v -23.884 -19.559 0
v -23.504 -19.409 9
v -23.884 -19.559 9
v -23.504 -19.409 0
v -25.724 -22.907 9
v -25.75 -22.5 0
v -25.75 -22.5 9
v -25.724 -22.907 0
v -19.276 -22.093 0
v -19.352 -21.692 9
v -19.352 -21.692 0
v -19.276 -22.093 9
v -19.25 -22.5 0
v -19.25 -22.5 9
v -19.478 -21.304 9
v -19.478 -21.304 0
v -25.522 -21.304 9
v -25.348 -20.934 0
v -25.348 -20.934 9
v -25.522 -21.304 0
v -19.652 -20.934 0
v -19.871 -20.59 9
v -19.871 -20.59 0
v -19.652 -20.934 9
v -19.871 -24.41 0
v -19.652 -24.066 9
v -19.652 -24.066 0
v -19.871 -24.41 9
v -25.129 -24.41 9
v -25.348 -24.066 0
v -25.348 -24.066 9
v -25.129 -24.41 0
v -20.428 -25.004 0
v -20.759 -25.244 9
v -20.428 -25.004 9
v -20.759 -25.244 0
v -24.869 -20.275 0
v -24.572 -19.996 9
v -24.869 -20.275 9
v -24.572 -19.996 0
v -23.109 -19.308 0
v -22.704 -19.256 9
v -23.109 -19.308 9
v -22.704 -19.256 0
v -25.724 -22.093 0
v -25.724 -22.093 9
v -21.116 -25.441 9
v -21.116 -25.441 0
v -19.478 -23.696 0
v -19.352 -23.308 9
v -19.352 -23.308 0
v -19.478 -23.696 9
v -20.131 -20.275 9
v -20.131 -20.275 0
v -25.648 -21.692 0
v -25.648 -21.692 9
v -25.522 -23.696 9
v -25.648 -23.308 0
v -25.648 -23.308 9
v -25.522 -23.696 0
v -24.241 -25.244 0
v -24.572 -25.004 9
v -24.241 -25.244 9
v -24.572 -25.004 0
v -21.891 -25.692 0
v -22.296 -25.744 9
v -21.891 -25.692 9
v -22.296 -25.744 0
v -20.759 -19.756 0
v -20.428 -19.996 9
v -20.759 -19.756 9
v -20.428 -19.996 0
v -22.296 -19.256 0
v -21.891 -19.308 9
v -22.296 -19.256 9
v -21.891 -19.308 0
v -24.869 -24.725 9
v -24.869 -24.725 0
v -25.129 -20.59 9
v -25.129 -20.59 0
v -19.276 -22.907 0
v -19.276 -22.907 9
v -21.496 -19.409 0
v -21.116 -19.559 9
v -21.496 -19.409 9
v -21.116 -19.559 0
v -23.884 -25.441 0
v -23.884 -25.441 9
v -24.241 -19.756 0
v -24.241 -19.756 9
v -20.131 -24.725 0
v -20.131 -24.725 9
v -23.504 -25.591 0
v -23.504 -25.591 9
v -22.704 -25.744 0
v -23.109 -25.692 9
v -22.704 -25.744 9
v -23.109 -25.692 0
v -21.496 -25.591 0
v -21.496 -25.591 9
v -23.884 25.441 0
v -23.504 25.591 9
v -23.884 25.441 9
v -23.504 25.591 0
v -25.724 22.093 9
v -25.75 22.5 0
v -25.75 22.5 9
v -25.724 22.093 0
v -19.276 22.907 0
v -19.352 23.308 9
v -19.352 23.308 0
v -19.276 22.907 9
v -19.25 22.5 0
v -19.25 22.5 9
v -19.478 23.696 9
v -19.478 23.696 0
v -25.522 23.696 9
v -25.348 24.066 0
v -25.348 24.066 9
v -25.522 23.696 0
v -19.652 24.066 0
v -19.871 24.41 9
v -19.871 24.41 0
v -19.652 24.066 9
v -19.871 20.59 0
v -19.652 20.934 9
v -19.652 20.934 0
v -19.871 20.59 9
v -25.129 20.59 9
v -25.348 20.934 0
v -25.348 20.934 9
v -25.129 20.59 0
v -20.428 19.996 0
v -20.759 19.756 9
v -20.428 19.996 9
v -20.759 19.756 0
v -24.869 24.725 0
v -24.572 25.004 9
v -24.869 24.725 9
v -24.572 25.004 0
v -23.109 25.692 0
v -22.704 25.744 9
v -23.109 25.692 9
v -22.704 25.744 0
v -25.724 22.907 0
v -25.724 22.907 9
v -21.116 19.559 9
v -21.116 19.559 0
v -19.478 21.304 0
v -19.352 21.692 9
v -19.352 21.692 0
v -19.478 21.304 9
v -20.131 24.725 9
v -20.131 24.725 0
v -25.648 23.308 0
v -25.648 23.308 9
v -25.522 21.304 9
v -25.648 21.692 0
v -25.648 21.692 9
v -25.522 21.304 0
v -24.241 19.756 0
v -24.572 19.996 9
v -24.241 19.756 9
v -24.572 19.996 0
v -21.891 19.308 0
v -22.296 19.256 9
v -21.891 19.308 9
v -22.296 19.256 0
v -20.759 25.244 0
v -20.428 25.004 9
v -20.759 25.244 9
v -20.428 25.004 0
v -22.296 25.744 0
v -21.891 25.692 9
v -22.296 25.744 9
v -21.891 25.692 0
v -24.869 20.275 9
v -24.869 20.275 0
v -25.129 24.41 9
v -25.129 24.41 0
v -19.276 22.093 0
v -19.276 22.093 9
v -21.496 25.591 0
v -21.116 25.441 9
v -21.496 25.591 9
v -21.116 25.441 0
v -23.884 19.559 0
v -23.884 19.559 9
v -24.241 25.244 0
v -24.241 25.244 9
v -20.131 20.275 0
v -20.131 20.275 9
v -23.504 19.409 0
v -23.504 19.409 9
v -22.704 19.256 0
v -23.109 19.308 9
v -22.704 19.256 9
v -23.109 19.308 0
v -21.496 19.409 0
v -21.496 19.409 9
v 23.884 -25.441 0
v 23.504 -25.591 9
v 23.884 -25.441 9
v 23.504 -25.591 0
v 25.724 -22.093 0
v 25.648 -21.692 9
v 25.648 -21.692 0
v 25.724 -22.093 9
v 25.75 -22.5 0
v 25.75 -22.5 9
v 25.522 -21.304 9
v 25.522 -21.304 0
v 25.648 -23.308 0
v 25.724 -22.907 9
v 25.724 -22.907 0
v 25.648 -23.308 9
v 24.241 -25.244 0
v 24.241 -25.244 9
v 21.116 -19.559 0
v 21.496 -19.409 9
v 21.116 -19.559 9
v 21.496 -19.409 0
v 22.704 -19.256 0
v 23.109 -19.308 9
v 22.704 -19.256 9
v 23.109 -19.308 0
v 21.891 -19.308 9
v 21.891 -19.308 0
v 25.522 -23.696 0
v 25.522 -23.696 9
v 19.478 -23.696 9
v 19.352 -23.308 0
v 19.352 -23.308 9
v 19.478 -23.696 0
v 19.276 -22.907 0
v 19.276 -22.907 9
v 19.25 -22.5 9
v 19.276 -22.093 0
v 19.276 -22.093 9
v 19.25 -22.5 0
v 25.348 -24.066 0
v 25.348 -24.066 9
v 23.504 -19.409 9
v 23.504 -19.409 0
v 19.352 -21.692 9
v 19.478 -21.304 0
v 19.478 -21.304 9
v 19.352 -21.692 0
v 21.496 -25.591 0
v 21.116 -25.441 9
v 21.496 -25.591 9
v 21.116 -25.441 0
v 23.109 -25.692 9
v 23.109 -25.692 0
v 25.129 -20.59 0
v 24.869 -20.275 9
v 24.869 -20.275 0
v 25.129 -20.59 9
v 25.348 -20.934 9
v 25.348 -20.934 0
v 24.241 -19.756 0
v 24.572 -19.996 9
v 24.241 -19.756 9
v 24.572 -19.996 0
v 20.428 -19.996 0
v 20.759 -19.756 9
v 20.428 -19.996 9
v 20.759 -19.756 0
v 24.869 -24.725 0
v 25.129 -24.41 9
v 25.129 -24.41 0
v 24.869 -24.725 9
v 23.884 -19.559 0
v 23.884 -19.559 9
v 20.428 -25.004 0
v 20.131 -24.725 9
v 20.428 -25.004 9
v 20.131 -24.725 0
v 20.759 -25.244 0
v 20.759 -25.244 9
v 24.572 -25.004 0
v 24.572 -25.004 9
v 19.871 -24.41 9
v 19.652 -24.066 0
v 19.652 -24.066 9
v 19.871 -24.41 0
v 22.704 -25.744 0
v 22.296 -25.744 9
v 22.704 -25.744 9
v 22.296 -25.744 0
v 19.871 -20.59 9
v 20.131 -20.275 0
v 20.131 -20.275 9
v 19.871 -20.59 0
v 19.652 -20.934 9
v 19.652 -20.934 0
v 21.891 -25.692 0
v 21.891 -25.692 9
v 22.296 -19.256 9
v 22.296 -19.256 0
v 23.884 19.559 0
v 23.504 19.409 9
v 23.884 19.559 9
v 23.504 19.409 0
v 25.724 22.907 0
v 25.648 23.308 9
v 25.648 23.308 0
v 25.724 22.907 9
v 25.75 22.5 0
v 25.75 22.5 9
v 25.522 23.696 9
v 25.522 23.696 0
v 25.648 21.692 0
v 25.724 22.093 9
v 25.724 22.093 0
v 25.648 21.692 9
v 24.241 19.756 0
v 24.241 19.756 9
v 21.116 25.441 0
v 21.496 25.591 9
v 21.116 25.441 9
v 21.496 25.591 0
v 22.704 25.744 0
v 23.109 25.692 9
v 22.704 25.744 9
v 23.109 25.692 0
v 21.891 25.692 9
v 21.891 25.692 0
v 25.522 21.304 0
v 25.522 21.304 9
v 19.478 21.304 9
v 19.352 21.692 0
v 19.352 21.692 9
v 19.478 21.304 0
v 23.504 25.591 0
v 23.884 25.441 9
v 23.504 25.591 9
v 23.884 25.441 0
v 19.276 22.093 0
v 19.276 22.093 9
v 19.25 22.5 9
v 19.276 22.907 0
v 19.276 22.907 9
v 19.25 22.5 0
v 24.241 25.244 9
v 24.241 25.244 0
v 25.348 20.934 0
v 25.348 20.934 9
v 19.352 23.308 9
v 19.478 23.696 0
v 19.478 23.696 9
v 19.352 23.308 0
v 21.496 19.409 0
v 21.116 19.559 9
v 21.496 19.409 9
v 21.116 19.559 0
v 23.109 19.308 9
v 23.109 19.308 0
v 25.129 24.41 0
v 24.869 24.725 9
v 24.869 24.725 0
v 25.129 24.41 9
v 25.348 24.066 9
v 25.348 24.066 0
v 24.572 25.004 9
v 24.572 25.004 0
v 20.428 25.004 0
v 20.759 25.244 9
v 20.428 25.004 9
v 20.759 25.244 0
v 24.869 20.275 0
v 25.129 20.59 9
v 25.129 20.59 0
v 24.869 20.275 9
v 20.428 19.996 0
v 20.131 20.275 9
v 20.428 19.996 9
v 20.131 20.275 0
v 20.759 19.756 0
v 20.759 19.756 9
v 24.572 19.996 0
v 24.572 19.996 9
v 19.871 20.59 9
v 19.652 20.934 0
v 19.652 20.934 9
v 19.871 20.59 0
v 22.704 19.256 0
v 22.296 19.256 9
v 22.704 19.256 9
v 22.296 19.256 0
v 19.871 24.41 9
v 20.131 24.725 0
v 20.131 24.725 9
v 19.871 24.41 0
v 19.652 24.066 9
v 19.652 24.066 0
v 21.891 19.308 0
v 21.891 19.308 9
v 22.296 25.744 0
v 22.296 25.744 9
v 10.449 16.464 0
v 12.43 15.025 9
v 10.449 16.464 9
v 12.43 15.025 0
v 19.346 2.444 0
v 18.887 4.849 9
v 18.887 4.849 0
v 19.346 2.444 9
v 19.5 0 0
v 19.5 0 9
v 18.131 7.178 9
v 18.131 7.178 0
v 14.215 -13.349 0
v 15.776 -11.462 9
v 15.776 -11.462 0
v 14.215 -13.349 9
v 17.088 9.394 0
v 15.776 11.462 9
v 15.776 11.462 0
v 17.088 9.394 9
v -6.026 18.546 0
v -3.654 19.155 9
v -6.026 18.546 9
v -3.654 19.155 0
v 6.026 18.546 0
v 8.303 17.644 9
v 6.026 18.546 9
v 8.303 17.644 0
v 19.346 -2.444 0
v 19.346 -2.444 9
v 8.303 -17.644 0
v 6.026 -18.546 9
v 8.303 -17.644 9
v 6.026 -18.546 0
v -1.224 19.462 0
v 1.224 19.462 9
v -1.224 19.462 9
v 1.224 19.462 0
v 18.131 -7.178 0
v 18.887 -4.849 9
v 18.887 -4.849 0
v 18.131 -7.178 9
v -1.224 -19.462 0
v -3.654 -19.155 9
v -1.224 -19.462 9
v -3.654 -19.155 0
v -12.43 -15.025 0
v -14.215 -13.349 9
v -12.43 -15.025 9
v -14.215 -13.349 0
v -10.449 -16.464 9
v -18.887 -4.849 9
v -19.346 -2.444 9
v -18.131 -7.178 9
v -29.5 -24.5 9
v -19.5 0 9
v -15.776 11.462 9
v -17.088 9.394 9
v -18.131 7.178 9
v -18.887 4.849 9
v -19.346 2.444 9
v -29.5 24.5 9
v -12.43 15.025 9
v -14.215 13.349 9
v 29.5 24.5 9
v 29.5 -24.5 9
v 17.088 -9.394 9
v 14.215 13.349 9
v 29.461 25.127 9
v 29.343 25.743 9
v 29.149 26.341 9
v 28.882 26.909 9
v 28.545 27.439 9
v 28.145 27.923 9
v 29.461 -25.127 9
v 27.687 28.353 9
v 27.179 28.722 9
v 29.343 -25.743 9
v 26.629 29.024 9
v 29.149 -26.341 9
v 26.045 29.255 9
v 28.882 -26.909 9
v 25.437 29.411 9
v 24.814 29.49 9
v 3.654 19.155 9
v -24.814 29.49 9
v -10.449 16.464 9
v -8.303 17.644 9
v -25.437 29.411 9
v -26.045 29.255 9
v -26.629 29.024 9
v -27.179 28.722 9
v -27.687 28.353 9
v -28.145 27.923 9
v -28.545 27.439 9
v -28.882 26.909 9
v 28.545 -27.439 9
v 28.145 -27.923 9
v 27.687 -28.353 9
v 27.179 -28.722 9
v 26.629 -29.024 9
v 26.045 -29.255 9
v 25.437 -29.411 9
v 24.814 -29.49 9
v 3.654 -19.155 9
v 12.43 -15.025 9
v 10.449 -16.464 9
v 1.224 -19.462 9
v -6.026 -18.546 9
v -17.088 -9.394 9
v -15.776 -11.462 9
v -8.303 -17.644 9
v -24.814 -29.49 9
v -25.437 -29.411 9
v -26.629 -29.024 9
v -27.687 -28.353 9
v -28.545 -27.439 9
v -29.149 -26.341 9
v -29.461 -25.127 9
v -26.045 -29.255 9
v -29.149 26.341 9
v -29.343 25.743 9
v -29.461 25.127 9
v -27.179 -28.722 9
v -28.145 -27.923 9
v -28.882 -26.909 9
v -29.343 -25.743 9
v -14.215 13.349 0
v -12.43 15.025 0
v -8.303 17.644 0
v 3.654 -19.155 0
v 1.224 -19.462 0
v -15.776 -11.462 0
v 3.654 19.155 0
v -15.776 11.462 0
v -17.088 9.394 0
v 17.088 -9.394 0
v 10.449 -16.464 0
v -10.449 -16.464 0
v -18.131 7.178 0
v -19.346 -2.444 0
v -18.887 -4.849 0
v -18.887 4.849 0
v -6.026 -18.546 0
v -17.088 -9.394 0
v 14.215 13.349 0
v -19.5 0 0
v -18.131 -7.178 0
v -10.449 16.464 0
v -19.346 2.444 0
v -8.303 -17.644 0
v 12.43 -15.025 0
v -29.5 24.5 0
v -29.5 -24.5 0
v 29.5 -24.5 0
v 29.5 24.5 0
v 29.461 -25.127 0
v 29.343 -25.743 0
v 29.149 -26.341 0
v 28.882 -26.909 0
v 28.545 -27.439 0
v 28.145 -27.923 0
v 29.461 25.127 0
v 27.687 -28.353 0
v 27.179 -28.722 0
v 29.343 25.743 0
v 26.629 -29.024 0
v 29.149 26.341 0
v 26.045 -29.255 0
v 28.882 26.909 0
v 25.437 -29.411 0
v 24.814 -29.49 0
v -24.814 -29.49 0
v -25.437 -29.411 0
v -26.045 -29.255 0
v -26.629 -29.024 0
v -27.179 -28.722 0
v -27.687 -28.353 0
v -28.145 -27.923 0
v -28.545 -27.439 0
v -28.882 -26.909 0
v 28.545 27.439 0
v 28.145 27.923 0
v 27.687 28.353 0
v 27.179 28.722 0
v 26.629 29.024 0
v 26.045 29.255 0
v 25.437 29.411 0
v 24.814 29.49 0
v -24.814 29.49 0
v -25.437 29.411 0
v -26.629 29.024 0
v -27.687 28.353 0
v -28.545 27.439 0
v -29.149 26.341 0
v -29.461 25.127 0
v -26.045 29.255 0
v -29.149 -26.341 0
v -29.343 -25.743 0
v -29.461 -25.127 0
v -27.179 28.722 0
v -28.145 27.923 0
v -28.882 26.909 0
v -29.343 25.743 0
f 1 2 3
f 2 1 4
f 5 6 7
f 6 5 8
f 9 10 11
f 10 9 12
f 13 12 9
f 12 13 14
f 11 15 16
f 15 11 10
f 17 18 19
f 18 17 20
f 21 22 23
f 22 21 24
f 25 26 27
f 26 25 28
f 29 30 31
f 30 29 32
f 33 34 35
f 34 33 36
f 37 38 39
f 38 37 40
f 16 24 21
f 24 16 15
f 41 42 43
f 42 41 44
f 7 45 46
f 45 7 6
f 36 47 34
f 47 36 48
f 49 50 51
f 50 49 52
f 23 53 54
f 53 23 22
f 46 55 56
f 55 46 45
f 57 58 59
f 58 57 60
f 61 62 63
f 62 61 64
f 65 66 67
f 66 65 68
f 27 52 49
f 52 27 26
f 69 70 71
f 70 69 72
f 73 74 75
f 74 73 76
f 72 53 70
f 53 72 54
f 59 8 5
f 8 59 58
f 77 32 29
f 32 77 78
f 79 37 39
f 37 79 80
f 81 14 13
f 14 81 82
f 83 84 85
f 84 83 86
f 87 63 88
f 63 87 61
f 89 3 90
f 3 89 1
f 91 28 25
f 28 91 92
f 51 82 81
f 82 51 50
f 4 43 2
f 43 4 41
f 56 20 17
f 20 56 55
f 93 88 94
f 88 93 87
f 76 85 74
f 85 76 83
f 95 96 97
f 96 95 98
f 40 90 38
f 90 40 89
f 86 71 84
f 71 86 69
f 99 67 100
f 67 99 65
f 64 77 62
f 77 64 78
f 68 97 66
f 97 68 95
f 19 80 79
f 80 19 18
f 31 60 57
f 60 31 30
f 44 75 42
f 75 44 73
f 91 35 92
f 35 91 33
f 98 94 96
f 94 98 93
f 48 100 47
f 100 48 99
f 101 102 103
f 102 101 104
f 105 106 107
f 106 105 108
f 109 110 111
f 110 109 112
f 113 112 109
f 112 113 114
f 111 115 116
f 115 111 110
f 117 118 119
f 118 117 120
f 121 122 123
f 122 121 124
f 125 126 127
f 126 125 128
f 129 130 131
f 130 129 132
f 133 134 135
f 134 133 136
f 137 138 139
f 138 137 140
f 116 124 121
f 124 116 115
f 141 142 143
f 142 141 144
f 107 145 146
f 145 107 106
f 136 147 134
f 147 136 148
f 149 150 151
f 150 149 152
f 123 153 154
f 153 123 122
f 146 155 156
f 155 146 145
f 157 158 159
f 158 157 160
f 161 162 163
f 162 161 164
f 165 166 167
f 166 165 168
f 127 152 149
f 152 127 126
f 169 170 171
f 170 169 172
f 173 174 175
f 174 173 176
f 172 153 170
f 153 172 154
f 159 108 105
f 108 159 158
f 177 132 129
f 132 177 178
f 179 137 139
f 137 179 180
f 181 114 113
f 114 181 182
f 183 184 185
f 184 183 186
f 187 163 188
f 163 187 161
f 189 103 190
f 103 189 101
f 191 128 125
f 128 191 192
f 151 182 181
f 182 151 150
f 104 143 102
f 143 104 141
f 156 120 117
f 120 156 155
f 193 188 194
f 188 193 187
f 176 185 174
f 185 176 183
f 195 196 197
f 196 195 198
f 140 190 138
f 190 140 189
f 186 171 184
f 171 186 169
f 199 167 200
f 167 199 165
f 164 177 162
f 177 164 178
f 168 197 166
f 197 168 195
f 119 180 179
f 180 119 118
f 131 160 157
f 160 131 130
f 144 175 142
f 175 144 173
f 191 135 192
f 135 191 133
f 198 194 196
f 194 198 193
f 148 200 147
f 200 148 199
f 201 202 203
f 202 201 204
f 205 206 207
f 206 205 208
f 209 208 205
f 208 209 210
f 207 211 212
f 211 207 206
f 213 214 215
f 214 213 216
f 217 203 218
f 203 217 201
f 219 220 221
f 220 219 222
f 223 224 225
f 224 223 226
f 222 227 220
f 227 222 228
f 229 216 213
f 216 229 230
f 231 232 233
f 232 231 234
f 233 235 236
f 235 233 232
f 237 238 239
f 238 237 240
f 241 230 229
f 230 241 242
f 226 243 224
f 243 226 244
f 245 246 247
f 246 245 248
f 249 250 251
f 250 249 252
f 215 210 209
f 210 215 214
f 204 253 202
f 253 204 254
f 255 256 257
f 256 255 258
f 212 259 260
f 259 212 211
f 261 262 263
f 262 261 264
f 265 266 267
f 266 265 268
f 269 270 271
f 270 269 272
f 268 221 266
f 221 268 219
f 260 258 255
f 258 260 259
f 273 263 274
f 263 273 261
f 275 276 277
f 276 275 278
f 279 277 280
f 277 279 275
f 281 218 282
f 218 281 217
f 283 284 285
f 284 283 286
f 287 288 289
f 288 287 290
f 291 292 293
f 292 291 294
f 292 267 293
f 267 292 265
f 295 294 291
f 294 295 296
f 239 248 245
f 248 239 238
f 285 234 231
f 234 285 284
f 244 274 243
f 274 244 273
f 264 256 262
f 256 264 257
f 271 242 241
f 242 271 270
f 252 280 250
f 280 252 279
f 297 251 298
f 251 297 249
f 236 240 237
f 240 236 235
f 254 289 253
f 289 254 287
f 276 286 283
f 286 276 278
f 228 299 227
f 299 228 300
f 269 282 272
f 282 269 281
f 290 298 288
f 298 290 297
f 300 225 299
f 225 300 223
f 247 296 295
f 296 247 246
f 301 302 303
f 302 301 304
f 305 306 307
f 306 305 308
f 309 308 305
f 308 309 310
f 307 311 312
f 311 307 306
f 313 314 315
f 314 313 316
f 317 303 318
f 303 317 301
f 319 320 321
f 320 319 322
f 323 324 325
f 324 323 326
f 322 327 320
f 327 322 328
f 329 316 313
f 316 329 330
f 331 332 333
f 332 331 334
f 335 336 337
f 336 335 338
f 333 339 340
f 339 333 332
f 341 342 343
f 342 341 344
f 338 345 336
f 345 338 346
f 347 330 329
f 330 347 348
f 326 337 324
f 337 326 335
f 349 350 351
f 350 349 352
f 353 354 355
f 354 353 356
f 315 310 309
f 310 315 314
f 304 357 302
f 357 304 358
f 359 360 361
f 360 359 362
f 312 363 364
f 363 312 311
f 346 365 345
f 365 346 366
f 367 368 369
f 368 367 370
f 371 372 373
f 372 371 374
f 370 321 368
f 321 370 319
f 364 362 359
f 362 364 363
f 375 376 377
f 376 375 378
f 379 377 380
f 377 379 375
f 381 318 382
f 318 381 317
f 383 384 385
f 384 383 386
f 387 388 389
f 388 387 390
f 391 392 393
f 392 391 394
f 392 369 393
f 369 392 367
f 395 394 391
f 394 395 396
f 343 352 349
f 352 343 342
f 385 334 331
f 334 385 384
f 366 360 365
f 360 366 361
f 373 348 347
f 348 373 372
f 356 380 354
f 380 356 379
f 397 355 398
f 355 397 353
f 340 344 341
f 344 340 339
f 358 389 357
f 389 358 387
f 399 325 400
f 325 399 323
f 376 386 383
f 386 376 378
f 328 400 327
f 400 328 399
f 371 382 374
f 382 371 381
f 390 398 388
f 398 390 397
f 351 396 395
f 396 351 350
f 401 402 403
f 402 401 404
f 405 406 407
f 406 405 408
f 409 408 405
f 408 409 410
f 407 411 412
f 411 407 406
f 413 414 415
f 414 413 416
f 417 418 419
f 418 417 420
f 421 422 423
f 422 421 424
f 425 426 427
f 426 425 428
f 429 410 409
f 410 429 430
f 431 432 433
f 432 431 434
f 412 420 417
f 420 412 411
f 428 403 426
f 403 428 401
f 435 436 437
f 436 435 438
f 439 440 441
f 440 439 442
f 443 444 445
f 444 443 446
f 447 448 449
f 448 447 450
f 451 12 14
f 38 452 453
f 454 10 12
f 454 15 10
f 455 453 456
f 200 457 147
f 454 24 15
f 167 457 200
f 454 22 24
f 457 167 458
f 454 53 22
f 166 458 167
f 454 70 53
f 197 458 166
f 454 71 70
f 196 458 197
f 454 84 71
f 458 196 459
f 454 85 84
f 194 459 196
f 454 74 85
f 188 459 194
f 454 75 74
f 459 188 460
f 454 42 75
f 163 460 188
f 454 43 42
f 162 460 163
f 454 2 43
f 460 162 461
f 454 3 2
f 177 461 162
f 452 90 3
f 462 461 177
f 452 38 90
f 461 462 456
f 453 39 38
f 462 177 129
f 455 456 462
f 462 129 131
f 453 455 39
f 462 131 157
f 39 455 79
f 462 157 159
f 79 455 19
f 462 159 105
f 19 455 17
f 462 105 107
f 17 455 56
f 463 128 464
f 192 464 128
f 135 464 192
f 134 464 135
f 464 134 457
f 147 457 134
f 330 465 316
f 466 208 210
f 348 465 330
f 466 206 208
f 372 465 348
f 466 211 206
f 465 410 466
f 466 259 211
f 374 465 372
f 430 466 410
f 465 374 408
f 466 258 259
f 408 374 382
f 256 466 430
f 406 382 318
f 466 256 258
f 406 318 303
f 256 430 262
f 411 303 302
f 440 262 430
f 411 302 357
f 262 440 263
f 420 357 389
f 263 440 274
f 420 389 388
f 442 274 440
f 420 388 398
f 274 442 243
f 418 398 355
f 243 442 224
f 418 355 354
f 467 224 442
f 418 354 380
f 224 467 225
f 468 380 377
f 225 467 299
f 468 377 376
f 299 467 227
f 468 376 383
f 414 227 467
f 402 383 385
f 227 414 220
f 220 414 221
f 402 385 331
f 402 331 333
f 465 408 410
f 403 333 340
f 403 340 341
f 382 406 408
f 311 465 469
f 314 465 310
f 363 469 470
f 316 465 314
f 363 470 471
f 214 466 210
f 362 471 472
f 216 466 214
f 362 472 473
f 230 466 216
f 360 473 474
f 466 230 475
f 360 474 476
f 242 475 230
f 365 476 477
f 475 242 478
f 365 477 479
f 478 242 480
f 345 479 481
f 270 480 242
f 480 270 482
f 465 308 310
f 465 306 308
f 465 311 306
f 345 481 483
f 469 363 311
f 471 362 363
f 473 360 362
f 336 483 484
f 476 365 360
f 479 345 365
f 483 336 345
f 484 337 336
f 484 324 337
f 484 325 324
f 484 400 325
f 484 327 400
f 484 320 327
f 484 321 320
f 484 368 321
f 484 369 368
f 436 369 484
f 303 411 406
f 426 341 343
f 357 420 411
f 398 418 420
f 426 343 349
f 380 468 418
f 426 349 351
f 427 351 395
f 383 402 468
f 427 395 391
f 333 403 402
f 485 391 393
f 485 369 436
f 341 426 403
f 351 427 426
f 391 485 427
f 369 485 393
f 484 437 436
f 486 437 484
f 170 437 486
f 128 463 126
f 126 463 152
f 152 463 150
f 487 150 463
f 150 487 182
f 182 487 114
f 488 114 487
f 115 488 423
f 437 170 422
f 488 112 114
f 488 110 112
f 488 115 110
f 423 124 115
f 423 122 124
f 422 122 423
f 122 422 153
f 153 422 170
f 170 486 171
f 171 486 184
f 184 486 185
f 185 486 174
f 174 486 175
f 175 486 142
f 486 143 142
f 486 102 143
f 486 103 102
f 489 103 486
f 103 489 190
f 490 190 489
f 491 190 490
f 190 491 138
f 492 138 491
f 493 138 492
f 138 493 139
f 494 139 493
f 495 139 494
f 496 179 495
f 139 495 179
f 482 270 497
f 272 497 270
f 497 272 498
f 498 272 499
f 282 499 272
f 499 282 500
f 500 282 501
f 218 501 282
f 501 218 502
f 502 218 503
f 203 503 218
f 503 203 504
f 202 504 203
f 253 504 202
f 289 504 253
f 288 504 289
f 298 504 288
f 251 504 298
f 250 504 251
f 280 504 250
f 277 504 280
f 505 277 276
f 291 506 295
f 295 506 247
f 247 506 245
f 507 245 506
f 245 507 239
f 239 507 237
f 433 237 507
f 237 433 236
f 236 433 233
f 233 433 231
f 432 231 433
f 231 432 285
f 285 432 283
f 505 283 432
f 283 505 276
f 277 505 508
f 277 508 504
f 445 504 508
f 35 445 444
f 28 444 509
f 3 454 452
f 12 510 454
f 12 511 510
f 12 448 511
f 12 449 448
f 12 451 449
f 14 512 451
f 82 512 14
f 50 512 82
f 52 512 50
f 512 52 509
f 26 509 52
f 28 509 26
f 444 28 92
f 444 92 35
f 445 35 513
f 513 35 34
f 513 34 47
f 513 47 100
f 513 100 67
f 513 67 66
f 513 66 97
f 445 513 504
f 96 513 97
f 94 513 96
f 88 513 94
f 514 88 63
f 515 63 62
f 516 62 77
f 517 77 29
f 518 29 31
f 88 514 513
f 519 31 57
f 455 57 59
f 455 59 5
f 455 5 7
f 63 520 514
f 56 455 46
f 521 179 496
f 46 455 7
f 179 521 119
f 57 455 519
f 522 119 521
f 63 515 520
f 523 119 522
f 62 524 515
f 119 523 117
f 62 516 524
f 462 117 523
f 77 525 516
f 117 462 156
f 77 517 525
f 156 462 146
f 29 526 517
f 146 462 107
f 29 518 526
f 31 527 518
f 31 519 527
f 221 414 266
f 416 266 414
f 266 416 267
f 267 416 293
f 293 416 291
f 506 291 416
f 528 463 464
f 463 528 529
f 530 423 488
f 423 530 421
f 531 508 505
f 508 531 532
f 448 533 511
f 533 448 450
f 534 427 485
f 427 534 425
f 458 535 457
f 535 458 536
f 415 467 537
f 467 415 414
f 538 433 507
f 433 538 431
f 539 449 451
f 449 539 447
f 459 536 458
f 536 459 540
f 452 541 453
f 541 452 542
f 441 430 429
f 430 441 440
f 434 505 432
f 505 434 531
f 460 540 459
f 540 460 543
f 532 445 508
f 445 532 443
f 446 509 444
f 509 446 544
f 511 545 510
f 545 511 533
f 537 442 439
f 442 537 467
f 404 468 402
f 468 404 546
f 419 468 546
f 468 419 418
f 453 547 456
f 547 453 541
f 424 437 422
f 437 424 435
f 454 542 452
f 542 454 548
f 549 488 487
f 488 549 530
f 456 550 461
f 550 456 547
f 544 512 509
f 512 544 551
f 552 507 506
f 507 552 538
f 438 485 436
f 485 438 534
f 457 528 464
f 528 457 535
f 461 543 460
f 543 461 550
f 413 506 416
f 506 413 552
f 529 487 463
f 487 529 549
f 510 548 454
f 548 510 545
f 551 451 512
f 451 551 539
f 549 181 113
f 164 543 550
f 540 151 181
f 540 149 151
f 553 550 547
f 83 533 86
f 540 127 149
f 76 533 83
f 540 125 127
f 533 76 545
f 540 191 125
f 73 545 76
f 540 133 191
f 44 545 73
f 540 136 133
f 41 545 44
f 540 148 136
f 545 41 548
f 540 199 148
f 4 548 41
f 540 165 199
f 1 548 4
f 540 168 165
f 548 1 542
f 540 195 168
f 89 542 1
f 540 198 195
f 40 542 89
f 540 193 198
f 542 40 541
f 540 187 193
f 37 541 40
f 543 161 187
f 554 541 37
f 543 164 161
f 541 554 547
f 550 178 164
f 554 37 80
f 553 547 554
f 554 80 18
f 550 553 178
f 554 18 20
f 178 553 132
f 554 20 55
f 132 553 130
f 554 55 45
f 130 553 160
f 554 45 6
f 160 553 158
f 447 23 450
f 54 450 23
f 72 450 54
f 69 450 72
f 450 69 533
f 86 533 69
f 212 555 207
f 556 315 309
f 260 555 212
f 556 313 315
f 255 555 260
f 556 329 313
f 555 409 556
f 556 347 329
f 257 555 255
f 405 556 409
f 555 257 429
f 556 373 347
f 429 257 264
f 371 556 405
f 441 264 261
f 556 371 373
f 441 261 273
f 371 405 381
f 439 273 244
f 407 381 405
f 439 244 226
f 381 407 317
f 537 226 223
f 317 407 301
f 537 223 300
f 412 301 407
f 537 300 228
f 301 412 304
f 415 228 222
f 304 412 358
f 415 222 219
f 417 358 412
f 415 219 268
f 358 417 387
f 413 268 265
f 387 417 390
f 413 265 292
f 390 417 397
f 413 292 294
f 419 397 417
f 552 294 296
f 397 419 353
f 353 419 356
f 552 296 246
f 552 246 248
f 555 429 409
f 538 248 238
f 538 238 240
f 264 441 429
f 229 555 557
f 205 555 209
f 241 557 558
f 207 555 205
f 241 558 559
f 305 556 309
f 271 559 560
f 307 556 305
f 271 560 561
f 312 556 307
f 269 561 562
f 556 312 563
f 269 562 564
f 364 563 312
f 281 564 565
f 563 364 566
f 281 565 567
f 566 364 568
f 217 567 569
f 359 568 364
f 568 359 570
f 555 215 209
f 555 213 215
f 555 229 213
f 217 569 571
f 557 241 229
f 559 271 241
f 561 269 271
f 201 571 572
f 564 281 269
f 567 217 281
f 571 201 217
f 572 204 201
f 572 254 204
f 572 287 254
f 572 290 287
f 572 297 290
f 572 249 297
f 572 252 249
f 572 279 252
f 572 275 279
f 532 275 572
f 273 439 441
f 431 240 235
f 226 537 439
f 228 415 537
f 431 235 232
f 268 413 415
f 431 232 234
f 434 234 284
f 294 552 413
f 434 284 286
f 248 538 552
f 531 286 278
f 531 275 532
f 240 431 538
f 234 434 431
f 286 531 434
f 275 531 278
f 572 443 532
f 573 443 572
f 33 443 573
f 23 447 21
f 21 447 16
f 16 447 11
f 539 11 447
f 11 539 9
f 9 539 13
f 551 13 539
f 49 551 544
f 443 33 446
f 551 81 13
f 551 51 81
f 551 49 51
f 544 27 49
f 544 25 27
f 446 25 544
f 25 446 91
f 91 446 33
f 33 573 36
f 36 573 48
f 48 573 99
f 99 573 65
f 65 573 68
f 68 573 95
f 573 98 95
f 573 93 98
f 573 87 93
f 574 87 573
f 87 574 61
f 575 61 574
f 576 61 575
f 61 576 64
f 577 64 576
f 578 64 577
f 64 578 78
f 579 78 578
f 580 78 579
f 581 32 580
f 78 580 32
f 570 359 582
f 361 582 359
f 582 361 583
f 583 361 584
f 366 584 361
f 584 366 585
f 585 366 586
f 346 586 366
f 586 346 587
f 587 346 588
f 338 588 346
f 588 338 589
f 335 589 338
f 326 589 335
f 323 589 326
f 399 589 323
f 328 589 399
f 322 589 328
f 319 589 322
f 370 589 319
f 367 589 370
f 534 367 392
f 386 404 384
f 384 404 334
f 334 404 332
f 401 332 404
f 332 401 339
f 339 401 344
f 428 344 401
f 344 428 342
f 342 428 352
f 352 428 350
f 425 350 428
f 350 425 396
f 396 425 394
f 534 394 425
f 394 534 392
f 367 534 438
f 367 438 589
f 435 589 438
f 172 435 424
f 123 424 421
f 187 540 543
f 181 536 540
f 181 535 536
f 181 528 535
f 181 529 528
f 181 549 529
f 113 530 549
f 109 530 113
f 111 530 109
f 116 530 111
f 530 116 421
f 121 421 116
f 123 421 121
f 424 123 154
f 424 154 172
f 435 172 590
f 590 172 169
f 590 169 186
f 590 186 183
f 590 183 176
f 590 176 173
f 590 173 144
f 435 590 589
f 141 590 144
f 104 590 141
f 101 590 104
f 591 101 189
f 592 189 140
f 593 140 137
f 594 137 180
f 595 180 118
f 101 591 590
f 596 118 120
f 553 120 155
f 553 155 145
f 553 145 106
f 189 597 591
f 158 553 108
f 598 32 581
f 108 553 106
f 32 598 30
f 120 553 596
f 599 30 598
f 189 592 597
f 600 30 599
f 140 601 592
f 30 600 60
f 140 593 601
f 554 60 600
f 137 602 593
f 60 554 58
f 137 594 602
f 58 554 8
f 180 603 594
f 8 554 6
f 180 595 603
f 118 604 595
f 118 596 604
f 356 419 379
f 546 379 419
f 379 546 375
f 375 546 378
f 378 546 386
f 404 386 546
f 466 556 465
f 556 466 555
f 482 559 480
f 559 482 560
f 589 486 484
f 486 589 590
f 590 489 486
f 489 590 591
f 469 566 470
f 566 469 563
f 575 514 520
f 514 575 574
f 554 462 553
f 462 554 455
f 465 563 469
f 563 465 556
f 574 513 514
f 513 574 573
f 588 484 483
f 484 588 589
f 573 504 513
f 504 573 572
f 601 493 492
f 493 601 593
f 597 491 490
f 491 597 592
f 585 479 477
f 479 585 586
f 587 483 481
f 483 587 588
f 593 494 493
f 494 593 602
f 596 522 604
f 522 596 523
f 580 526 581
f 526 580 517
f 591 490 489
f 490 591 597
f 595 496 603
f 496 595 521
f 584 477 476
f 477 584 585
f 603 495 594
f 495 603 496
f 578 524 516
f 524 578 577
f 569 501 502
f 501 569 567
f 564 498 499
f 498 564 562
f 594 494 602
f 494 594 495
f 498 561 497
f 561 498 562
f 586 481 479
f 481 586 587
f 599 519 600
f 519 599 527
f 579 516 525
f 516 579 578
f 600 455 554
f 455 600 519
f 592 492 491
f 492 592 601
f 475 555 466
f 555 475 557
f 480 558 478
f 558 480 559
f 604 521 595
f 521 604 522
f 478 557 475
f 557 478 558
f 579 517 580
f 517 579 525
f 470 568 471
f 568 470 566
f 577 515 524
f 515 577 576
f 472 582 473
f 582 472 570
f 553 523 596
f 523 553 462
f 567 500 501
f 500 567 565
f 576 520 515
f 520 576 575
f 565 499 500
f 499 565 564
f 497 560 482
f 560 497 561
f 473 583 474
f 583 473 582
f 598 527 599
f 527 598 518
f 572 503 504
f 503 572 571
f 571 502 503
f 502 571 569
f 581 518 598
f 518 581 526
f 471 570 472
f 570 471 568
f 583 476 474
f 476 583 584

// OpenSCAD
$fn = 50;

difference() {
	union() {
		hull() {
			translate(v = [-24.5, 24.5, 0]) {
				cylinder(h = 9, r = 5);
			}
			translate(v = [24.5, 24.5, 0]) {
				cylinder(h = 9, r = 5);
			}
			translate(v = [-24.5, -24.5, 0]) {
				cylinder(h = 9, r = 5);
			}
			translate(v = [24.5, -24.5, 0]) {
				cylinder(h = 9, r = 5);
			}
		}
	}
	union() {
		translate(v = [-22.5, -22.5, -100.0]) {
			cylinder(h = 200, r = 3.25);
		}
		translate(v = [-22.5, 22.5, -100.0]) {
			cylinder(h = 200, r = 3.25);
		}
		translate(v = [22.5, -22.5, -100.0]) {
			cylinder(h = 200, r = 3.25);
		}
		translate(v = [22.5, 22.5, -100.0]) {
			cylinder(h = 200, r = 3.25);
		}
		translate(v = [-22.5, -22.5, -100.0]) {
			cylinder(h = 200, r = 1.8);
		}
		translate(v = [-22.5, 22.5, -100.0]) {
			cylinder(h = 200, r = 1.8);
		}
		translate(v = [22.5, -22.5, -100.0]) {
			cylinder(h = 200, r = 1.8);
		}
		translate(v = [22.5, 22.5, -100.0]) {
			cylinder(h = 200, r = 1.8);
		}
		cylinder(h = 9, r = 19.5);
	}
}
